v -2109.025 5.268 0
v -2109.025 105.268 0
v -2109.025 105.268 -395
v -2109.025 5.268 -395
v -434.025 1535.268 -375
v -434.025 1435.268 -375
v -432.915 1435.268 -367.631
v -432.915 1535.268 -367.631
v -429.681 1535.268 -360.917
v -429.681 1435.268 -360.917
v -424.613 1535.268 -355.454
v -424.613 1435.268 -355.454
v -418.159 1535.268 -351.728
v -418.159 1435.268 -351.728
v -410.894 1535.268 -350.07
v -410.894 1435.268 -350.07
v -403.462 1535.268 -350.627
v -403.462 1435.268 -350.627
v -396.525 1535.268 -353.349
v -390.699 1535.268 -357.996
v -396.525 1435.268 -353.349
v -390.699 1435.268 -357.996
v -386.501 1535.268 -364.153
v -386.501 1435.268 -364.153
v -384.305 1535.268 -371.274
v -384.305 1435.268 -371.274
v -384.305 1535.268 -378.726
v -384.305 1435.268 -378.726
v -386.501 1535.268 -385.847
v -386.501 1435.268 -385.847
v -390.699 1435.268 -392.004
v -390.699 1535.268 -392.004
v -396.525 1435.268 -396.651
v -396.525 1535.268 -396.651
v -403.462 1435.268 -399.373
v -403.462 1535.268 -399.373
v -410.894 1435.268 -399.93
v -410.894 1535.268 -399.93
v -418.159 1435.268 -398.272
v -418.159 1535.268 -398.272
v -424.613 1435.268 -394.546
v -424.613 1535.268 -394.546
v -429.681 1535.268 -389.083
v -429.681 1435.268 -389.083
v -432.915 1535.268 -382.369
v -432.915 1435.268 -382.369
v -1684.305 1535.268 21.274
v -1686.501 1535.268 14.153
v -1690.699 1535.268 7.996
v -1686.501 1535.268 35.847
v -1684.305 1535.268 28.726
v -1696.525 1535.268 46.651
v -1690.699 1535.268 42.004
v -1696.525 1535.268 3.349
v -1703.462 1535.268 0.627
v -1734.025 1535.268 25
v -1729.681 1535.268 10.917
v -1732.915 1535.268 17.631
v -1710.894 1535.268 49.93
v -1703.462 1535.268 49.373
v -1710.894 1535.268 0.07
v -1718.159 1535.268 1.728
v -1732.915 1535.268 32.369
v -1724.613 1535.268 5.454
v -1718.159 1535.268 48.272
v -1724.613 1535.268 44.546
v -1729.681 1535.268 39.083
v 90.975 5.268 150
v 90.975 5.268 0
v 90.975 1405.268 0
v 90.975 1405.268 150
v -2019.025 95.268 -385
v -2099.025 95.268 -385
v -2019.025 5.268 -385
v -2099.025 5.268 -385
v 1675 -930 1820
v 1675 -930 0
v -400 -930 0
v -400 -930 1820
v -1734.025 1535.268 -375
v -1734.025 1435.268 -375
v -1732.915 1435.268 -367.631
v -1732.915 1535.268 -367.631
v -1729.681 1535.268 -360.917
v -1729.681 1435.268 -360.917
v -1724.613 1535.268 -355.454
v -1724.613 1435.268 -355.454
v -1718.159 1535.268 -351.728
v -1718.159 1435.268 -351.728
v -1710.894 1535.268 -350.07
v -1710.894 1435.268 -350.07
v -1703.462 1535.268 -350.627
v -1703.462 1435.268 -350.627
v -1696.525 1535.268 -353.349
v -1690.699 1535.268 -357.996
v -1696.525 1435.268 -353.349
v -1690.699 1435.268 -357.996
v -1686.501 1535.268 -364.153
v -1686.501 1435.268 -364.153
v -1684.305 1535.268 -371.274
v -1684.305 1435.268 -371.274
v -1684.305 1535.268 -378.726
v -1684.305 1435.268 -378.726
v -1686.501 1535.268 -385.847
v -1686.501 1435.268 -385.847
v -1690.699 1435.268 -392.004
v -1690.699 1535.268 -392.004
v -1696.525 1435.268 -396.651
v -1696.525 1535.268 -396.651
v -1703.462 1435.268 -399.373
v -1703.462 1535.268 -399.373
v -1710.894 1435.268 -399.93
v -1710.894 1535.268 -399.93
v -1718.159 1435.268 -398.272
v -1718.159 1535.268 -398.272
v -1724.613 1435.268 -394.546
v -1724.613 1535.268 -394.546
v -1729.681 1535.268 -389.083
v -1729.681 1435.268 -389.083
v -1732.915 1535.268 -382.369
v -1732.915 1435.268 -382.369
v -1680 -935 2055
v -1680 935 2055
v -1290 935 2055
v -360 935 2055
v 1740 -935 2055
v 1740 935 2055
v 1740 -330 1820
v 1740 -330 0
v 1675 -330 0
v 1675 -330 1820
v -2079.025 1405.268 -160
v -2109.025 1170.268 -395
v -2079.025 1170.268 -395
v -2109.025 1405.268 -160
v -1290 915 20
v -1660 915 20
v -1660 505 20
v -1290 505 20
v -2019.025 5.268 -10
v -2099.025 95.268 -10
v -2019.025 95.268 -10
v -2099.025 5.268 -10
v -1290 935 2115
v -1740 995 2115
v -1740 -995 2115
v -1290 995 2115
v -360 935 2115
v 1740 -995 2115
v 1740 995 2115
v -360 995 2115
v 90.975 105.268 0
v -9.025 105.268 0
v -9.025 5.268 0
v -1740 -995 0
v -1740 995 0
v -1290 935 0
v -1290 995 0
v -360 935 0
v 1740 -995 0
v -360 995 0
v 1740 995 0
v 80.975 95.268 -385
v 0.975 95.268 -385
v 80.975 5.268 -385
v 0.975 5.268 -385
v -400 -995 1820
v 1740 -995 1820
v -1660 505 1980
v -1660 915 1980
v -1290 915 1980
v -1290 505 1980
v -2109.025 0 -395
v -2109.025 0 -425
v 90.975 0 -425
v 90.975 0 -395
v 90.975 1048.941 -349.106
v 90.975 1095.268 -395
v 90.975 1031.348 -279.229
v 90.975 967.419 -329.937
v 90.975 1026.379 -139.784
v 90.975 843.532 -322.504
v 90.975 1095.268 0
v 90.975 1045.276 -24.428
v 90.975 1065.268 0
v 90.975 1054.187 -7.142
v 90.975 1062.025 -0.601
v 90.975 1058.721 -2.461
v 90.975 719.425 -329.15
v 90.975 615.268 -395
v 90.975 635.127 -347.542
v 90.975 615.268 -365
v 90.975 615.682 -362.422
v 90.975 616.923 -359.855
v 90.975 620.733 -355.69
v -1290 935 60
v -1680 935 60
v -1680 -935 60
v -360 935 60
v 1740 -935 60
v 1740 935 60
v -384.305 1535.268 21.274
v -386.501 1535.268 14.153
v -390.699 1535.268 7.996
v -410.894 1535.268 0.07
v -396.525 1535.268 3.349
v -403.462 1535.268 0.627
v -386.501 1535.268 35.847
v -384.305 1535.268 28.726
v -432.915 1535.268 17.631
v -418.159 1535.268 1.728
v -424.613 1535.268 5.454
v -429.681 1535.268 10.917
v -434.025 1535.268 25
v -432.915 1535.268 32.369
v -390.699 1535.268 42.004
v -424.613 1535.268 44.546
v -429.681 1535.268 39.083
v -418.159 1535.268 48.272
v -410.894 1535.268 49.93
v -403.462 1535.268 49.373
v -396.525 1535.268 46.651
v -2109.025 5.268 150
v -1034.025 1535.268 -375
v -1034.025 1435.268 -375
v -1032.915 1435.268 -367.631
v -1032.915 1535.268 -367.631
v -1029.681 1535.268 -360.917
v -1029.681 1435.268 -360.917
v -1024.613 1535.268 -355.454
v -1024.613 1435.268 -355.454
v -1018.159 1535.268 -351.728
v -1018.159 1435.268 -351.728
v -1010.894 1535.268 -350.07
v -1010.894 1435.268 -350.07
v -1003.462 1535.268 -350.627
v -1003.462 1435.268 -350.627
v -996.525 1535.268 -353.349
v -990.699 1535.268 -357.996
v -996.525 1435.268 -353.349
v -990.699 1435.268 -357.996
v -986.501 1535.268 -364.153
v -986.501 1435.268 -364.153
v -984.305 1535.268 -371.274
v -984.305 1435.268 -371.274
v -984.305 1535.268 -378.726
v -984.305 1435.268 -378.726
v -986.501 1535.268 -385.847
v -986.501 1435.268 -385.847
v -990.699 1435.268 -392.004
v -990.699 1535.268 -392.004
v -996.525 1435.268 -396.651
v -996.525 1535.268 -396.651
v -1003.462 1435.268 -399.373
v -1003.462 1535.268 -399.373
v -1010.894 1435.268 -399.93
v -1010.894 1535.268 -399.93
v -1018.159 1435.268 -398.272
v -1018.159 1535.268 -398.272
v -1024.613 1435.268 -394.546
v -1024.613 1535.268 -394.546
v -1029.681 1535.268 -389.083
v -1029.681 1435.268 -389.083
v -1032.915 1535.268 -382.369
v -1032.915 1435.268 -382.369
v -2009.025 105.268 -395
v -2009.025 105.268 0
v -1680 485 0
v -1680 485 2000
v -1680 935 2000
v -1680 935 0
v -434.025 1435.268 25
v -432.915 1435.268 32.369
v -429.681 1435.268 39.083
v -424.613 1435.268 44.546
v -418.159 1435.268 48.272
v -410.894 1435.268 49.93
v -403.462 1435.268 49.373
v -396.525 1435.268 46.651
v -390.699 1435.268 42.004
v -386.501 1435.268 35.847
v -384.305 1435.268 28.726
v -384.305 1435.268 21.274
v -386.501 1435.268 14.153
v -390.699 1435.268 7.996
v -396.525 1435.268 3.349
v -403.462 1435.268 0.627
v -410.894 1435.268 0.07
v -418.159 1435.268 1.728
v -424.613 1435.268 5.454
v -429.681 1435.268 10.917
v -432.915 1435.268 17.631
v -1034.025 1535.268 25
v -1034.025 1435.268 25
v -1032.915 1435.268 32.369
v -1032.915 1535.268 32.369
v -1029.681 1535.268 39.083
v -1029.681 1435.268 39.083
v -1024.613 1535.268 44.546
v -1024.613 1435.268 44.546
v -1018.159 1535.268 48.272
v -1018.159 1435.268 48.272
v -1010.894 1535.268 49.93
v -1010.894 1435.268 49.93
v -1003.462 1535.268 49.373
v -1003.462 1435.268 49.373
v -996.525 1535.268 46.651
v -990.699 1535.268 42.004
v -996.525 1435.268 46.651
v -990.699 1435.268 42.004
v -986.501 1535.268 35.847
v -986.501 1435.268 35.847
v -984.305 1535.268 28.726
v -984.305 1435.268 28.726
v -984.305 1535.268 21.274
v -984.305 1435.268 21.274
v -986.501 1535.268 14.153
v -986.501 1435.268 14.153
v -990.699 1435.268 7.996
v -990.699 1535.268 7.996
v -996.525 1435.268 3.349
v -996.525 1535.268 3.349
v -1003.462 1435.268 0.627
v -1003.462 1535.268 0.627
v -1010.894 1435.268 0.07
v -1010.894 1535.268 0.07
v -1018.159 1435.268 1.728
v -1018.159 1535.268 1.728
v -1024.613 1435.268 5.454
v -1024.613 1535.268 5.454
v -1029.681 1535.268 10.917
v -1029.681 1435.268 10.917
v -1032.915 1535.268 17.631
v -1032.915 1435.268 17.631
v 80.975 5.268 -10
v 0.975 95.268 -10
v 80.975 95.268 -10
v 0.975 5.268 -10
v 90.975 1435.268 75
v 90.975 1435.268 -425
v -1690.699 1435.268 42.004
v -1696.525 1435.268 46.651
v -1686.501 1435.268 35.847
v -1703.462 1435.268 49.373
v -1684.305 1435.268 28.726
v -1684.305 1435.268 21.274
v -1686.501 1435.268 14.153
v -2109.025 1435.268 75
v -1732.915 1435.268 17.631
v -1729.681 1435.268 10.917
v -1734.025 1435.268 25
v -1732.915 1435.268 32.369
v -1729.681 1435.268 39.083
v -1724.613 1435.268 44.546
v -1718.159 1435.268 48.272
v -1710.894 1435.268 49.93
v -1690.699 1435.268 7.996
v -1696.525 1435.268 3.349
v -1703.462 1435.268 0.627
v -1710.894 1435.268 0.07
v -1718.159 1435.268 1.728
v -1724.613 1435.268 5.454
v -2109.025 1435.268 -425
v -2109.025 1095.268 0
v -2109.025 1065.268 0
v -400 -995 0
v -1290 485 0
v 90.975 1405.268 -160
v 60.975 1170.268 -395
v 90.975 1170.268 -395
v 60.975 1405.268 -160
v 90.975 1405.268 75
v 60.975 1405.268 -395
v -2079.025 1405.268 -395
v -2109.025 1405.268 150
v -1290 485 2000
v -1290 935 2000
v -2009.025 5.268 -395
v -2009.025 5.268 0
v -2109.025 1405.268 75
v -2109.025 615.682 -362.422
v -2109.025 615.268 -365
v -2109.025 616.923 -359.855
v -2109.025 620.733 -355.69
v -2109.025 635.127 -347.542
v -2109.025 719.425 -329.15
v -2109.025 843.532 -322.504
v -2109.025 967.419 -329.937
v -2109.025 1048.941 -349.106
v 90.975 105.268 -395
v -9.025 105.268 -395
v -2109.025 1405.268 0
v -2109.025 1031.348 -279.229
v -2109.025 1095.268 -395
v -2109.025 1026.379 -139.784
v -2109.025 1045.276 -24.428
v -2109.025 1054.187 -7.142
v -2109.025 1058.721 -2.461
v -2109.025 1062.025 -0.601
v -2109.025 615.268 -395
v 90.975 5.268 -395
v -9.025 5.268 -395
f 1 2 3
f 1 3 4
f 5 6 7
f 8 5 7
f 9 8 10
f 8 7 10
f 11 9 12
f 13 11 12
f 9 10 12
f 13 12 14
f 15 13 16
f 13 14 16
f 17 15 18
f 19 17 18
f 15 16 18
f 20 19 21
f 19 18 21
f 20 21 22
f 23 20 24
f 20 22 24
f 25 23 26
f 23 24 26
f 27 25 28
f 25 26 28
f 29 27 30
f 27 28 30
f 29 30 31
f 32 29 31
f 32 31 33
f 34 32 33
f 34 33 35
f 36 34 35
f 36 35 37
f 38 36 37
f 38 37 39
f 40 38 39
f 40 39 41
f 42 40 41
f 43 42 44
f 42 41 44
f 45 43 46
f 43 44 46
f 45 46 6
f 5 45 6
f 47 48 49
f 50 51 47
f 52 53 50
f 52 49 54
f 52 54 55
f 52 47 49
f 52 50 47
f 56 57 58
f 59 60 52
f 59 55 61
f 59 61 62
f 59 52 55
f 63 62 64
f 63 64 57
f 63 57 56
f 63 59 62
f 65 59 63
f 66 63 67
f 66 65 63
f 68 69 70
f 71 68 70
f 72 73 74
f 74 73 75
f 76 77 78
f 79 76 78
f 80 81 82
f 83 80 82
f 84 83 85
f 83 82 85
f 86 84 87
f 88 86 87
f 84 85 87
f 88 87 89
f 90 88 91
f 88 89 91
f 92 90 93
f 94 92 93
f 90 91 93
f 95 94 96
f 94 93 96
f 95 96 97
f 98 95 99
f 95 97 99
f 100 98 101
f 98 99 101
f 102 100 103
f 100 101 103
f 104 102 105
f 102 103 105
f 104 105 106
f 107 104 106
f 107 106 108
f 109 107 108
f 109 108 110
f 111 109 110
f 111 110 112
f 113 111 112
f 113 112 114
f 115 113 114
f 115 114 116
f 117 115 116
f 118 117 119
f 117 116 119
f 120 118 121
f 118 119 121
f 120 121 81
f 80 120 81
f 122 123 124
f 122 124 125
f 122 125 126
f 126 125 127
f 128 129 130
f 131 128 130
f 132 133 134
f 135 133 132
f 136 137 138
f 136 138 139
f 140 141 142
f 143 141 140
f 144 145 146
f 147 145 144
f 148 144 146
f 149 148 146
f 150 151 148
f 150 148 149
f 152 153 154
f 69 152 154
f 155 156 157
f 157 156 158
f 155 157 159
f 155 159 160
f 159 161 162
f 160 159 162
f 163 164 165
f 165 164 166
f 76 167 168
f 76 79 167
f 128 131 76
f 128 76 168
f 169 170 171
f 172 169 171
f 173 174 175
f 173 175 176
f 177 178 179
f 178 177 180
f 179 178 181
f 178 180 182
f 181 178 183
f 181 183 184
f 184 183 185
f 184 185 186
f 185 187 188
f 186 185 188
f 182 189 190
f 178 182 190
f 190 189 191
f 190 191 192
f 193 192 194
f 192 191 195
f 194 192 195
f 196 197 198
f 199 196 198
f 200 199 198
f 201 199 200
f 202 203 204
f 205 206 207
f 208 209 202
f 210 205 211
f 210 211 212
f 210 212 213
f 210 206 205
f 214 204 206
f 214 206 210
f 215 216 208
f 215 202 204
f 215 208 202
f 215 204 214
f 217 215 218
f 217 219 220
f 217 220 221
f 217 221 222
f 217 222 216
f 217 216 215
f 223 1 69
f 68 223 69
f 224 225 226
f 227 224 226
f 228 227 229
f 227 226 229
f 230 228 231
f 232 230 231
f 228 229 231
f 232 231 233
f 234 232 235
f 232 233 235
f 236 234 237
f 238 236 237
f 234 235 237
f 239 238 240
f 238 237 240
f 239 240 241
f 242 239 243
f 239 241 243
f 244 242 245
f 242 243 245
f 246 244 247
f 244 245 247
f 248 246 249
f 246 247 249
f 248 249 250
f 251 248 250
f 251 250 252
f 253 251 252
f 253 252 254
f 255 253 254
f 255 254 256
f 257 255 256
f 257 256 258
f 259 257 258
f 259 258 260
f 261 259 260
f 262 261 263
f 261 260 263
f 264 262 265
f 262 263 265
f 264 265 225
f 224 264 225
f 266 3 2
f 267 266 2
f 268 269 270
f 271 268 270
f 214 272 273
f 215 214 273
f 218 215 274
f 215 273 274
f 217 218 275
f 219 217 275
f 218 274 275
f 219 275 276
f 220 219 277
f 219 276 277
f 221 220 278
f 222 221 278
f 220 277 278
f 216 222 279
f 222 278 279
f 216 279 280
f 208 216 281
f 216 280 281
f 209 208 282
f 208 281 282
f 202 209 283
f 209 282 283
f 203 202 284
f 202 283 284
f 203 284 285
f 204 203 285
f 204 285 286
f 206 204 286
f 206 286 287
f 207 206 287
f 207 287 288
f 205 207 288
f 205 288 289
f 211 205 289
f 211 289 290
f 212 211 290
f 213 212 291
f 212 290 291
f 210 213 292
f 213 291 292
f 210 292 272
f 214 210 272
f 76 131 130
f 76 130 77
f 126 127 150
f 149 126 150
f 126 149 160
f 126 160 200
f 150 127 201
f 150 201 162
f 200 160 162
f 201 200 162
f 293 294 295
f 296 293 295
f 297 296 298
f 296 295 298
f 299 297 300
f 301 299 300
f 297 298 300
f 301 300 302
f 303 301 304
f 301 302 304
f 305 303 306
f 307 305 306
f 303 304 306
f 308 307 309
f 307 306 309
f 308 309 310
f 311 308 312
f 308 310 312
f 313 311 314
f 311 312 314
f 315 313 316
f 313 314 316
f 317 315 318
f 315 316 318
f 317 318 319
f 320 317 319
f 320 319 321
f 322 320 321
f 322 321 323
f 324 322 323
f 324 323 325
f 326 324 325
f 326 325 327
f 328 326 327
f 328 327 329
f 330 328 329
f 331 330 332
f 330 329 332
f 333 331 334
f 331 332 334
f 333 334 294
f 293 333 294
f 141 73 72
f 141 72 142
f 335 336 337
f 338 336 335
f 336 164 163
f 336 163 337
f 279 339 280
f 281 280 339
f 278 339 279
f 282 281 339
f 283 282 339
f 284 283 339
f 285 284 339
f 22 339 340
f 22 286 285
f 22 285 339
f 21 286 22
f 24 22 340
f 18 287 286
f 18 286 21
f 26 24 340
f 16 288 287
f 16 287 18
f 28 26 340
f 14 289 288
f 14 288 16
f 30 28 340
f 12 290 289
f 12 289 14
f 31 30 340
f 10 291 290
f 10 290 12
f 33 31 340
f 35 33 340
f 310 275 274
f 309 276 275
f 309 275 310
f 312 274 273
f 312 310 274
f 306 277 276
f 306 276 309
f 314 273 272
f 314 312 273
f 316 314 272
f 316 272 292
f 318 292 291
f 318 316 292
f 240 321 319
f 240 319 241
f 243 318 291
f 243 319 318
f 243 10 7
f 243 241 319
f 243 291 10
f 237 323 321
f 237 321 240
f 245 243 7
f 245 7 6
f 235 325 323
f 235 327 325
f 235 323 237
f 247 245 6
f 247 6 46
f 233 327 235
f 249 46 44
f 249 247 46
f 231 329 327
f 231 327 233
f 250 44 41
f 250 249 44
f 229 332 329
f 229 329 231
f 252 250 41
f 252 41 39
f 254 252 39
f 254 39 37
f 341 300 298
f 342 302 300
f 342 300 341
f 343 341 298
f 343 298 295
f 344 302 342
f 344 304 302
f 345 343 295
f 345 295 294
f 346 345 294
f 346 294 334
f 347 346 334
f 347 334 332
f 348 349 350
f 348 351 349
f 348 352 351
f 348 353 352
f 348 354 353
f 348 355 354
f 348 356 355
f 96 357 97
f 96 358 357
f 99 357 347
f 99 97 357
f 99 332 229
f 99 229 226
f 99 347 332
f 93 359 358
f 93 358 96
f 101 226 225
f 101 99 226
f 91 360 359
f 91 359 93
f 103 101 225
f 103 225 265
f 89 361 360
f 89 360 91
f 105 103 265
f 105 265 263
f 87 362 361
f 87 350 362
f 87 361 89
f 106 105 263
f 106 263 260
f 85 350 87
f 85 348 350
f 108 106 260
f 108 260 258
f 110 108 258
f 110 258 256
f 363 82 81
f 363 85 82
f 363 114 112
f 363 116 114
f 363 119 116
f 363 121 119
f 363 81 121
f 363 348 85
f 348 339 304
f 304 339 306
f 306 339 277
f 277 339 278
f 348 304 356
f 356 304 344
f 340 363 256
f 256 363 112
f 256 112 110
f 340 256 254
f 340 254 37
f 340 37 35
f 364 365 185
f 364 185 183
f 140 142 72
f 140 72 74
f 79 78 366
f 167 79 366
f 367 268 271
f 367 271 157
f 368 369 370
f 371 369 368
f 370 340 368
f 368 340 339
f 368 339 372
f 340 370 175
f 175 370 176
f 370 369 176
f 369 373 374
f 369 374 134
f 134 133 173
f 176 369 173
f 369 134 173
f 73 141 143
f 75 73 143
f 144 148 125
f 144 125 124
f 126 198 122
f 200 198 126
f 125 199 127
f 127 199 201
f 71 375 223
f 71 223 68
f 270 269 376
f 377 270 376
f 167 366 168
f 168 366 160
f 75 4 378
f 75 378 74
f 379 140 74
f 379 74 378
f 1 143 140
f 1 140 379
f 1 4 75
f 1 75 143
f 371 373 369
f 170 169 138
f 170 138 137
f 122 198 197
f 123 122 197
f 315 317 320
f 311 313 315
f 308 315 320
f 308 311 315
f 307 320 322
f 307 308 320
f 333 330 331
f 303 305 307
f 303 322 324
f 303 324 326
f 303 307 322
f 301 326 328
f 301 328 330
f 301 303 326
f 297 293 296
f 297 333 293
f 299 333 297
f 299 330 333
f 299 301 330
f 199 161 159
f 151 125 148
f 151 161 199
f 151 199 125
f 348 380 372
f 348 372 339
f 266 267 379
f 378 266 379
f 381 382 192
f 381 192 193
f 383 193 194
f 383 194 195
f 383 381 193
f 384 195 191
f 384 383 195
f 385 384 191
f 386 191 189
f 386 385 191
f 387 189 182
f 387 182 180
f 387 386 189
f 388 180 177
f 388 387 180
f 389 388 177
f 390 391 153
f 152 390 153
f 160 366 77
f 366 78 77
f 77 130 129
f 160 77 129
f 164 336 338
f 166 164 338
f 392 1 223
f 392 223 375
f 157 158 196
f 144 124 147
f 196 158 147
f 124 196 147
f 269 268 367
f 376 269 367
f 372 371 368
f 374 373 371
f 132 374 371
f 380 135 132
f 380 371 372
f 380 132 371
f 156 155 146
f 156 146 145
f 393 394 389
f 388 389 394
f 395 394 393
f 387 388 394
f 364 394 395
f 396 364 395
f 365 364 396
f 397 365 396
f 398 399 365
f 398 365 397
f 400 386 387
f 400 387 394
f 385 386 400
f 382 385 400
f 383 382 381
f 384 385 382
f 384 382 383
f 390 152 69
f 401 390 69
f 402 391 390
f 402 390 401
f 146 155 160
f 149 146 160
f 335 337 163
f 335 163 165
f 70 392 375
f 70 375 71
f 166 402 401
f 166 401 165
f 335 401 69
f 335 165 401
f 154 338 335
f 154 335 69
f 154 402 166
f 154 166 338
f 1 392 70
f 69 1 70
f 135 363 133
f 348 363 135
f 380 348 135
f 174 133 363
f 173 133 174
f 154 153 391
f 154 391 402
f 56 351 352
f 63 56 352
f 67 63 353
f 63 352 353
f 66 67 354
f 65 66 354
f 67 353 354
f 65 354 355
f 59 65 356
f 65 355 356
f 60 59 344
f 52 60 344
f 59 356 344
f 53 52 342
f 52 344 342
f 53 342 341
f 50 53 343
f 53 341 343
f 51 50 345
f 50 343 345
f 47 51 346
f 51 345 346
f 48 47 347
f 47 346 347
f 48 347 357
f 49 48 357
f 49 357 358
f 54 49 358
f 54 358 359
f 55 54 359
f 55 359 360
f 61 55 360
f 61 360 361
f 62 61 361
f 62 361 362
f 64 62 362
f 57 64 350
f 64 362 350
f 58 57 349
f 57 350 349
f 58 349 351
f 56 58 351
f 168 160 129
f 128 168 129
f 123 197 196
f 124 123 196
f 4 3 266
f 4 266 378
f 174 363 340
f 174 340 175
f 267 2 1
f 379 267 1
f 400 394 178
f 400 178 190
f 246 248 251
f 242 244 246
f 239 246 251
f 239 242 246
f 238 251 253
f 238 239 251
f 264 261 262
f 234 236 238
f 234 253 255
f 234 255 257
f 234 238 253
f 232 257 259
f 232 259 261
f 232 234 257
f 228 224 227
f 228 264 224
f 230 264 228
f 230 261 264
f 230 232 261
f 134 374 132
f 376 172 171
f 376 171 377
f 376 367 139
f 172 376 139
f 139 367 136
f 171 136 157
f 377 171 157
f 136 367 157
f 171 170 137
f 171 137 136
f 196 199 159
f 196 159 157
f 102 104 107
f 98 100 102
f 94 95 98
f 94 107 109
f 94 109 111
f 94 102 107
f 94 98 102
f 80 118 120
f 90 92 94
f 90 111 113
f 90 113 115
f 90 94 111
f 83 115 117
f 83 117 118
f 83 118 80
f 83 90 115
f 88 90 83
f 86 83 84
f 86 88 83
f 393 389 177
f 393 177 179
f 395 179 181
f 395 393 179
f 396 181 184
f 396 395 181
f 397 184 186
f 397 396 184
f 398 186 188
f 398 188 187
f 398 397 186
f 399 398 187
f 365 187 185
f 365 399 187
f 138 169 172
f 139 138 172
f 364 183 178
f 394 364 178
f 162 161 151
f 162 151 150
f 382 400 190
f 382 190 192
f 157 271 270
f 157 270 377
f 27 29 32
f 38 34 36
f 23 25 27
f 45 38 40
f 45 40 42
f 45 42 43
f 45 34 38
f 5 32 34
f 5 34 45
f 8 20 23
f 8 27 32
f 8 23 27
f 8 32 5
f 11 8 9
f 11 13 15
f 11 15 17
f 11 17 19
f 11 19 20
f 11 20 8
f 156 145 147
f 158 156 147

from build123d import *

# Parameters (mm, degrees)
F0_W      = 3480
F0_H      = 1990
F1_DEPTH  = 2115
F4_T      = -60
F3_W      = 930
F3_H      = 2115
F5_DEPTH  = 60
F6_W      = 2200
F6_H      = 1400
F7_DEPTH  = 150
F10_DEPTH = 2200
F11_DEPTH = 2170
F12_DEPTH = 30
F14_R     = 25
F15_DEPTH = 100
F18_DEPTH = 2200
F17_W     = 100
F17_H     = 395
F19_DEPTH = 2200
F20_DEPTH = 2100
F21_DEPTH = 100
F22_T     = -10
F22_2_T   = -10
F23_W     = 390
F23_H     = 450
F24_DEPTH = 2000
F25_T     = -20
F27_DEPTH = 1820


with BuildPart() as f1:
    # F0 (on Top) → F1 (new body)
    with BuildSketch(Plane.XY):
        Rectangle(F0_W, F0_H)
    extrude(amount=F1_DEPTH)

    # F4
    f4_openings = [f1.faces().sort_by_distance(p)[0] for p in [
        (1740, 0, 1057.5),
    ]]
    offset(amount=F4_T, openings=f4_openings)

    # F3 (on offset) → F5 (cut)
    with BuildSketch(Plane(origin=(0, 995, 0), x_dir=(-1, 0, 0), z_dir=(0, 1, 0))):
        with Locations((825, 1057.5)):
            Rectangle(F3_W, F3_H)
    extrude(amount=-F5_DEPTH, mode=Mode.SUBTRACT)


with BuildPart() as f7:
    # F6 (on Top) → F7 (new body)
    with BuildSketch(Plane.XY):
        with Locations((-1009.0253487229, 705.2677765489)):
            Rectangle(F6_W, F6_H)
    extrude(amount=F7_DEPTH)


with BuildPart() as f10:
    # F9 (on offset) → F10 (new body)
    with BuildSketch(Plane(origin=(-2109.0253487229, 0, 0), x_dir=(0, -1, 0), z_dir=(-1, 0, 0))):
        Polygon((-1405.2677765489, -160), (-1405.2677765489, 75), (-1435.2677765489, 75), (-1435.2677765489, -425), (0, -425), (0, -395), (-1170.2677765489, -395), (-1405.2677765489, -395), align=None)
        Polygon((-1170.2677765489, -395), (-1405.2677765489, -160), (-1405.2677765489, -395), align=None)
    extrude(amount=-F10_DEPTH)

    # F9 (on offset) → F11 (cut)
    with BuildSketch(Plane(origin=(-2109.0253487229, 0, 0), x_dir=(0, -1, 0), z_dir=(-1, 0, 0))):
        Polygon((-1170.2677765489, -395), (-1405.2677765489, -160), (-1405.2677765489, -395), align=None)
    extrude(amount=-F11_DEPTH, mode=Mode.SUBTRACT)

    # F9 (on offset) → F12 (join)
    with BuildSketch(Plane(origin=(-2109.0253487229, 0, 0), x_dir=(0, -1, 0), z_dir=(-1, 0, 0))):
        Polygon((-1170.2677765489, -395), (-1405.2677765489, -160), (-1405.2677765489, -395), align=None)
    extrude(amount=-F12_DEPTH)

    # F14 (on offset) → F15 (join)
    with BuildSketch(Plane(origin=(0, 1435.2677765489, 0), x_dir=(-1, 0, 0), z_dir=(0, 1, 0))):
        with Locations((409.0253487229, 25)):
            Circle(F14_R)
        with Locations((1709.0253487229, 25)):
            Circle(F14_R)
        with Locations((1009.0253487229, 25)):
            Circle(F14_R)
        with Locations((409.0253487229, -375)):
            Circle(F14_R)
        with Locations((1009.0253487229, -375)):
            Circle(F14_R)
        with Locations((1709.0253487229, -375)):
            Circle(F14_R)
    extrude(amount=F15_DEPTH)


with BuildPart() as f18:
    # F17 (on offset) → F18 (new body)
    with BuildSketch(Plane(origin=(-2109.0253487229, 0, 0), x_dir=(0, -1, 0), z_dir=(-1, 0, 0))):
        Polygon((-1065.2677765489, 0), (-1095.2677765489, 0), (-1095.2677765489, -395), (-615.2677765489, -395), (-615.2677765489, -365), (-1065.2677765489, -365), align=None)
        with BuildLine():
            add(Edge.make_bspline(
                [(-1048.9412833992, -349.1059595814), (-1019.3944963274, -288.8335720097), (-1026.1483760671, -144.4167860049), (-1032.9022558067, 0), (-1065.2677765489, 0)],
                knots=[3.5620328245, 3.5620328245, 3.5620328245, 4.9226090658, 4.9226090658, 6.2831853072, 6.2831853072, 6.2831853072], degree=2, weights=[1, 0.7773915182, 1, 0.7773915182, 1]))
            Line((-1065.2677765489, 0), (-1065.2677765489, -365))
            Line((-1065.2677765489, -365), (-1048.9412833992, -349.1059595814))
        make_face()
        with BuildLine():
            Line((-1048.9412833992, -349.1059595814), (-1065.2677765489, -365))
            Line((-1065.2677765489, -365), (-615.2677765489, -365))
            add(Edge.make_bspline(
                [(-615.2677765489, -365), (-615.2677765489, -329.9535942352), (-797.4106828613, -323.278096034), (-979.5535891738, -316.6025978327), (-1048.9412833992, -349.1059595814)],
                knots=[0, 0, 0, 1.3791493544, 1.3791493544, 2.7582987089, 2.7582987089, 2.7582987089], degree=2, weights=[1, 0.771516679, 1, 0.771516679, 1]))
        make_face()
    extrude(amount=-F18_DEPTH)


with BuildPart() as f19:
    # F17 (on offset) → F19 (new body)
    with BuildSketch(Plane(origin=(-2109.0253487229, 0, 0), x_dir=(0, -1, 0), z_dir=(-1, 0, 0))):
        with Locations((-55.2677765489, -197.5)):
            Rectangle(F17_W, F17_H)
    extrude(amount=-F19_DEPTH)

    # F17 (on offset) → F20 (cut)
    with BuildSketch(Plane(origin=(-2109.0253487229, 0, 0), x_dir=(0, -1, 0), z_dir=(-1, 0, 0))):
        with Locations((-55.2677765489, -197.5)):
            Rectangle(F17_W, F17_H)
    extrude(amount=-F20_DEPTH, mode=Mode.SUBTRACT)

    # F22
    f22_openings = [f19.faces().sort_by_distance(p)[0] for p in [
        (40.974651, 5.267777, -197.5),
    ]]
    offset(amount=F22_T, openings=f22_openings)


with BuildPart() as f21:
    # F17 (on offset) → F21 (new body)
    with BuildSketch(Plane(origin=(-2109.0253487229, 0, 0), x_dir=(0, -1, 0), z_dir=(-1, 0, 0))):
        with Locations((-55.2677765489, -197.5)):
            Rectangle(F17_W, F17_H)
    extrude(amount=-F21_DEPTH)

    # F22#2
    f22_2_openings = [f21.faces().sort_by_distance(p)[0] for p in [
        (-2059.025349, 5.267777, -197.5),
    ]]
    offset(amount=F22_2_T, openings=f22_2_openings)


with BuildPart() as f24:
    # F23 (on Top) → F24 (new body)
    with BuildSketch(Plane.XY):
        with Locations((-1485, 710)):
            Rectangle(F23_W, F23_H)
    extrude(amount=F24_DEPTH)

    # F25
    f25_openings = [f24.faces().sort_by_distance(p)[0] for p in [
        (-1290, 710, 1000),
    ]]
    offset(amount=F25_T, openings=f25_openings)


with BuildPart() as f27:
    # F26 (on Top) → F27 (new body)
    with BuildSketch(Plane.XY):
        Polygon((-400, -995), (525, -995), (1740, -995), (1740, -330), (1675, -330), (1675, -930), (765, -930), (525, -930), (-400, -930), align=None)
    extrude(amount=F27_DEPTH)


solid = Compound([f1.part, f7.part, f10.part, f18.part, f19.part, f21.part, f24.part, f27.part])
